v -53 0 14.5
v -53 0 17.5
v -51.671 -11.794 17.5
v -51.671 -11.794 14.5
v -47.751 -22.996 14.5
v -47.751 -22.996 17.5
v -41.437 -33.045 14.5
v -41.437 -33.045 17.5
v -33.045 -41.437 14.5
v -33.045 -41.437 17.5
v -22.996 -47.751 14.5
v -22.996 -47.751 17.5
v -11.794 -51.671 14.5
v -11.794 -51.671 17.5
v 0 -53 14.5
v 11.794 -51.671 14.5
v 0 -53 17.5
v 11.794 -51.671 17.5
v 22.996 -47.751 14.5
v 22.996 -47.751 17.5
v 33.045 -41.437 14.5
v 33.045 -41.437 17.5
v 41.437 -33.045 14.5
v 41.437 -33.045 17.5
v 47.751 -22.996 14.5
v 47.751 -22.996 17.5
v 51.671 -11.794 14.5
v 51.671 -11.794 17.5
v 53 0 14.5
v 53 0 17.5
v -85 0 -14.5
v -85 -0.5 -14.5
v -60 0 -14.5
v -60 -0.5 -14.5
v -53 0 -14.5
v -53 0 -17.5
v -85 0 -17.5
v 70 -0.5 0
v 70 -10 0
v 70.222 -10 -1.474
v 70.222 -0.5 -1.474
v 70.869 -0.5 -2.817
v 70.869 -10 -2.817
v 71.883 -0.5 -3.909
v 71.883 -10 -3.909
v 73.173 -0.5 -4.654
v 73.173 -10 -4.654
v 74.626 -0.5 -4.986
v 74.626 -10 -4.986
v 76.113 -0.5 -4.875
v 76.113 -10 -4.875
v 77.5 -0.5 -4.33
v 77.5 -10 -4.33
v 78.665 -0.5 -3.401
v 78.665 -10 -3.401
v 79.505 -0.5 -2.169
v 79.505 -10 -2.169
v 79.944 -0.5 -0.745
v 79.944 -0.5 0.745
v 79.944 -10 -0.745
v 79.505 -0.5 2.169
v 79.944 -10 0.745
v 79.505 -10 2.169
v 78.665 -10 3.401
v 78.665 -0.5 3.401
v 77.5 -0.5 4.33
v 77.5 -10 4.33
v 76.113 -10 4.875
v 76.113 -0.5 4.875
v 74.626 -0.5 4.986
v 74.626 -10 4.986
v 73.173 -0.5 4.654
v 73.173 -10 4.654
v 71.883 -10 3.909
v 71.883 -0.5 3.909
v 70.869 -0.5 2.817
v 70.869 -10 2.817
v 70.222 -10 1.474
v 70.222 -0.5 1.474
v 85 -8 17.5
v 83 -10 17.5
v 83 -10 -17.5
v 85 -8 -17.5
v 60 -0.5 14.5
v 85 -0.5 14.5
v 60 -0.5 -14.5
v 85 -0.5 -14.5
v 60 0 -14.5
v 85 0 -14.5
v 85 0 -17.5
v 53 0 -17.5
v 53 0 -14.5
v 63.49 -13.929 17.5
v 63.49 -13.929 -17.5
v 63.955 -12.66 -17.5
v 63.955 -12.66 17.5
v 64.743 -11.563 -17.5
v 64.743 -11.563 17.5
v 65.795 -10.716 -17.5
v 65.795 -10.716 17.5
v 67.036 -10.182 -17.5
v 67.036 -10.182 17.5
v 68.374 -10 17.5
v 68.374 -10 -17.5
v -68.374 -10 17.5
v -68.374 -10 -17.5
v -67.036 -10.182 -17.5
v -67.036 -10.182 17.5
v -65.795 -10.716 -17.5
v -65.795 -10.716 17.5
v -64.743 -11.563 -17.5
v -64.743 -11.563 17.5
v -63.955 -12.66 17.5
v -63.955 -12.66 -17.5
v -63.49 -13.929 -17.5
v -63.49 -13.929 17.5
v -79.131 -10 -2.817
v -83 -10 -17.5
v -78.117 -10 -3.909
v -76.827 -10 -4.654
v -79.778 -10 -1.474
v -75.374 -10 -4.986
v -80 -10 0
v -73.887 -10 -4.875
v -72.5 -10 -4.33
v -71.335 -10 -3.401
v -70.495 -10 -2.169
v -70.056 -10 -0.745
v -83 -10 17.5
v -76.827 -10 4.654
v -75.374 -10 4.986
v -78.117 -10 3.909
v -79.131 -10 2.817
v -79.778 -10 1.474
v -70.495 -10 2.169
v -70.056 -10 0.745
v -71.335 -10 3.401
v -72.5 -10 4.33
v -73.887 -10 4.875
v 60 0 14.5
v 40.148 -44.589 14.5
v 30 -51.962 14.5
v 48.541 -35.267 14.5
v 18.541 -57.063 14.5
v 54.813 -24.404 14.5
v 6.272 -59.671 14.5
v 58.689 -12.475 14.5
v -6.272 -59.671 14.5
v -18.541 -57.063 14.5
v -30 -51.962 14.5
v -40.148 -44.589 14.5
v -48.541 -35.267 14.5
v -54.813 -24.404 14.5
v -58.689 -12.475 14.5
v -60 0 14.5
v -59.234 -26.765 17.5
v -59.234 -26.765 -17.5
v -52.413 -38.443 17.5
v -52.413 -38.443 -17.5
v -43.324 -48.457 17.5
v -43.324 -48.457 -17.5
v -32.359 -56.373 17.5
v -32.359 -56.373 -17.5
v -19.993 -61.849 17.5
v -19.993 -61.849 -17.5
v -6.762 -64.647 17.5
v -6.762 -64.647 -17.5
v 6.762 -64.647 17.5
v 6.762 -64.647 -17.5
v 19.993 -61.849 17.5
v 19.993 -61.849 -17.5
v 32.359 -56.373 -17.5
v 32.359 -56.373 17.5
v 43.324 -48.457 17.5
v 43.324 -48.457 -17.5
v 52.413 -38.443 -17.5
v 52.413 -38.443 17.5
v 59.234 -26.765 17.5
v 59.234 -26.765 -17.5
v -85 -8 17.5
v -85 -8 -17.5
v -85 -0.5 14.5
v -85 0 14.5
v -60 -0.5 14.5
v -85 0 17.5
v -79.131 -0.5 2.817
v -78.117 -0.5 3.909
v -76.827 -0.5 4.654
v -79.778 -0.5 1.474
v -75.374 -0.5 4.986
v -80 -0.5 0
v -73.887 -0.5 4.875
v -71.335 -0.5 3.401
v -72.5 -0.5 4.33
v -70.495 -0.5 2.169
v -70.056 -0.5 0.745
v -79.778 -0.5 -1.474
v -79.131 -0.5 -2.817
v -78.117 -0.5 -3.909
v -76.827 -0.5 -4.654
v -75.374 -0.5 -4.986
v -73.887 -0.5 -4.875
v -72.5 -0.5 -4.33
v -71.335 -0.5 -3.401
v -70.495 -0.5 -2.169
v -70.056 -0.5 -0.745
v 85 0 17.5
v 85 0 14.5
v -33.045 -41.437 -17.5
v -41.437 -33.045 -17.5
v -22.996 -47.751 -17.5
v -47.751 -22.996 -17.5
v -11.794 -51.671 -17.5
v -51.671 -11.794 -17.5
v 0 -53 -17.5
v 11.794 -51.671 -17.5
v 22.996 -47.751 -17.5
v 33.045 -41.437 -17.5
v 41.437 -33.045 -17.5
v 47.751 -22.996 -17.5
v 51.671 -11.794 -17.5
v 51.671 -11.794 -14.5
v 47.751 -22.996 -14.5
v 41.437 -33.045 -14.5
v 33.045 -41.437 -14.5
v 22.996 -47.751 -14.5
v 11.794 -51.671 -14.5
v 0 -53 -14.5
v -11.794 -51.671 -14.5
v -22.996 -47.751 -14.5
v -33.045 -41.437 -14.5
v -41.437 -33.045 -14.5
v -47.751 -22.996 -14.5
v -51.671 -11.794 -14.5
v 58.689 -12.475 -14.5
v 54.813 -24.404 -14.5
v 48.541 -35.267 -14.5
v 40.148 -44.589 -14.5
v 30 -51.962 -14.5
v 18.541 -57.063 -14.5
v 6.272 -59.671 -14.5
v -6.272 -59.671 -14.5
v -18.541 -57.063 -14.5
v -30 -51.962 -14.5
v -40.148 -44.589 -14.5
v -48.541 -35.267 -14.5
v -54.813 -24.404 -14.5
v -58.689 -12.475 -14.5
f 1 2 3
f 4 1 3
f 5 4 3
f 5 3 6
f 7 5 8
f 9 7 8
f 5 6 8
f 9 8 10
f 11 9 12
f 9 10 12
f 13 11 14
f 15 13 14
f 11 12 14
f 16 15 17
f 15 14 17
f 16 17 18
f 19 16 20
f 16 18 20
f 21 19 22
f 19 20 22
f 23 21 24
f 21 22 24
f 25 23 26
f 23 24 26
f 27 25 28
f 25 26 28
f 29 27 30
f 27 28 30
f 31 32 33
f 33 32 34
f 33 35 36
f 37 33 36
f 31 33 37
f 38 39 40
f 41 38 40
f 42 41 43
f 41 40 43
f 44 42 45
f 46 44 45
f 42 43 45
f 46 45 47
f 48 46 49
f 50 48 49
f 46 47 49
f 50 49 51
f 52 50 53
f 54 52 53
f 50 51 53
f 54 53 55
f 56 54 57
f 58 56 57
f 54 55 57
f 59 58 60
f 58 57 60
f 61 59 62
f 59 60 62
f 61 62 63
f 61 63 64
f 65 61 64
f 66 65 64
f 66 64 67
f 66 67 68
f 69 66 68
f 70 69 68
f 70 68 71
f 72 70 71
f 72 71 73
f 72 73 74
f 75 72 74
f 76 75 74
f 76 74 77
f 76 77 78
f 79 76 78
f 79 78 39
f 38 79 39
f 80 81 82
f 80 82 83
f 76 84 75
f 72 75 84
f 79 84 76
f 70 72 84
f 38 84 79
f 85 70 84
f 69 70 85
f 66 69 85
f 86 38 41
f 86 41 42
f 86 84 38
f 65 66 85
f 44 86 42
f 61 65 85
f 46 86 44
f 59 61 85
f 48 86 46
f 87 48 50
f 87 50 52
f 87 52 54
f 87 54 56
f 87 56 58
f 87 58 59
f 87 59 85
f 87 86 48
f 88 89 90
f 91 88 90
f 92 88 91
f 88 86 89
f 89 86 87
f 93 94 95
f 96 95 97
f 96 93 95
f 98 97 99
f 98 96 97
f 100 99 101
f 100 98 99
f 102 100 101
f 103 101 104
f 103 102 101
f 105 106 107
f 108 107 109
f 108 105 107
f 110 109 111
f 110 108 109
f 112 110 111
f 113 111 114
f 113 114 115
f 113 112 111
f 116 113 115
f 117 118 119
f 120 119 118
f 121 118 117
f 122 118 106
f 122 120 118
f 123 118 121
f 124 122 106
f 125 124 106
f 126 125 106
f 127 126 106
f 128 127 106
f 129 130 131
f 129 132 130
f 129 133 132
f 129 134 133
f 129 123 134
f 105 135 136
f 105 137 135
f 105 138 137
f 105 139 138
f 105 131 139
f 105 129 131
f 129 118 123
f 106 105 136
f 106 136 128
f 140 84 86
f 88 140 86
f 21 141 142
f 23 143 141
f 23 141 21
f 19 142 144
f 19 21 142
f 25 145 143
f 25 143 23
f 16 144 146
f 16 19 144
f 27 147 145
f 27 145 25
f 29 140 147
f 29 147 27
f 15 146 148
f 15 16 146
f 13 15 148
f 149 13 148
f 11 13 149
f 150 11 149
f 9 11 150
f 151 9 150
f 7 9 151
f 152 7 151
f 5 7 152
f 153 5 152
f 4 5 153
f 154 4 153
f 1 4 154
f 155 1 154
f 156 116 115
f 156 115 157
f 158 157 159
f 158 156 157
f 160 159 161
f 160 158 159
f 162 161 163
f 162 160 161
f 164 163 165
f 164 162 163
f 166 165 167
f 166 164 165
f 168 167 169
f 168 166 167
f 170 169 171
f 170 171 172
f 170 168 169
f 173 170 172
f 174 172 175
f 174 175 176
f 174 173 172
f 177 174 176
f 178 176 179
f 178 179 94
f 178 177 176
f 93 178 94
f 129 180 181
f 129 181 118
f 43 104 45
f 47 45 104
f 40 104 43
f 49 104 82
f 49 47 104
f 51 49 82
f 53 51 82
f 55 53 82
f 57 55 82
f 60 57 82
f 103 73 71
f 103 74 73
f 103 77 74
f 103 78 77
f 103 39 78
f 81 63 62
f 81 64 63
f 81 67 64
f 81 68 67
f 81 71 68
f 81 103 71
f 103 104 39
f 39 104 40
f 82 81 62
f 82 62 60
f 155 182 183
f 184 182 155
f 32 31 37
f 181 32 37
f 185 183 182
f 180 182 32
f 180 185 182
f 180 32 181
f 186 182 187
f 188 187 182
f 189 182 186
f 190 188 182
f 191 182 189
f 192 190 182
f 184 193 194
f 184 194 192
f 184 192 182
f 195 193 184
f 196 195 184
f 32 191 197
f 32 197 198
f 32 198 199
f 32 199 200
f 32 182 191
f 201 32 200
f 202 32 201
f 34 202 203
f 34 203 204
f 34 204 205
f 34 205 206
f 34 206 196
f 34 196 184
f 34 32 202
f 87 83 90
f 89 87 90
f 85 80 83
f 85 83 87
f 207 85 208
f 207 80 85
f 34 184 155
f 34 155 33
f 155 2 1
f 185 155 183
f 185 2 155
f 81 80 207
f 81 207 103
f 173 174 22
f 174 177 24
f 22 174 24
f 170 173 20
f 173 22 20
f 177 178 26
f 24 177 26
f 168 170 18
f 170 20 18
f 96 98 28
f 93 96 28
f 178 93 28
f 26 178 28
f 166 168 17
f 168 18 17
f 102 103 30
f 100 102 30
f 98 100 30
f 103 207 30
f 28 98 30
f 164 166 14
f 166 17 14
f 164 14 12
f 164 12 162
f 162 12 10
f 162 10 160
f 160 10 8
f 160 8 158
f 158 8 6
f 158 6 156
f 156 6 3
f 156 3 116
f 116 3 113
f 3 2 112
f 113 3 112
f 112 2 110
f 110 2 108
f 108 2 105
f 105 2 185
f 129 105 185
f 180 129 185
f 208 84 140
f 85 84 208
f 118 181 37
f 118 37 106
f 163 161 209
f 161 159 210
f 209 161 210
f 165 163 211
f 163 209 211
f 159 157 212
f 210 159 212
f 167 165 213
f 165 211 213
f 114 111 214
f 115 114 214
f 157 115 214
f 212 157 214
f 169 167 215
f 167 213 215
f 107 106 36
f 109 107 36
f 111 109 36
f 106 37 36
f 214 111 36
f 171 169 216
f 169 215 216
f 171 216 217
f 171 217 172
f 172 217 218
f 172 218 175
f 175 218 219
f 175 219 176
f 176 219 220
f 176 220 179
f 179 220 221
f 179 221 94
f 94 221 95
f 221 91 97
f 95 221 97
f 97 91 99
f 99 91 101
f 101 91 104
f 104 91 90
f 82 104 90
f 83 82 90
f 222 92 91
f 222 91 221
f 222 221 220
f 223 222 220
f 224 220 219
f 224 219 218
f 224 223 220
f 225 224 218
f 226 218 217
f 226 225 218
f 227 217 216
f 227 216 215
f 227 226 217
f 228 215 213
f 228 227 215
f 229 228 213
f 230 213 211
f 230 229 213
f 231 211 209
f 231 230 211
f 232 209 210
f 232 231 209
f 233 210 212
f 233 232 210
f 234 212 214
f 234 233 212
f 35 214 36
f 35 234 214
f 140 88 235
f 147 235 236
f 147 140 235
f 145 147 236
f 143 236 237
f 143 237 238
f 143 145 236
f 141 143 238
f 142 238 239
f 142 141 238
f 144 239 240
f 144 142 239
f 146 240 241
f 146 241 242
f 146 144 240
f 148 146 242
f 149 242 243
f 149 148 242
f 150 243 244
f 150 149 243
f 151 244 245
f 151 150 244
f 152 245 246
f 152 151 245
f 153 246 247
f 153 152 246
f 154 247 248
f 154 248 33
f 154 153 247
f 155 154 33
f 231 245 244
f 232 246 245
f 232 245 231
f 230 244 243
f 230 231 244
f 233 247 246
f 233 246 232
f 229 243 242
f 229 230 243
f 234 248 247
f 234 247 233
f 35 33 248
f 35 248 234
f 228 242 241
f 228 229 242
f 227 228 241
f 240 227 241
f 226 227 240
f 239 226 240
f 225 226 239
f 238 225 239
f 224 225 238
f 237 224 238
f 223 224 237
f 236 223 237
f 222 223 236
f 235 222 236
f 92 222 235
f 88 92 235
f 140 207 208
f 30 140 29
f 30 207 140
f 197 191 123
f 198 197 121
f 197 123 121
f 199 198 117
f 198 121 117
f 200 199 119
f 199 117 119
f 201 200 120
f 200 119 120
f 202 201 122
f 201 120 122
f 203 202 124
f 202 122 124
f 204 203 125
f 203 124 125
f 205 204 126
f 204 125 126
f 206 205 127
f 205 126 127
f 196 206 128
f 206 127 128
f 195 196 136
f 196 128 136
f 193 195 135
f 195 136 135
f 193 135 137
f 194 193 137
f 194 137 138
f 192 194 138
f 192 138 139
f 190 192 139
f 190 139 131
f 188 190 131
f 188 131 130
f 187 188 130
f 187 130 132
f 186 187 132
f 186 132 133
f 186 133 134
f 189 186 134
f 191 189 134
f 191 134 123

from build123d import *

# Parameters (mm, degrees)
DODANIE_WYCI_GNI_CIE1_DEPTH = 14.5
DODANIE_WYCI_GNI_CIE2_START = 3
DODANIE_WYCI_GNI_CIE2_DEPTH = 3
DODANIE_WYCI_GNI_CIE3_DEPTH = 3
OTW_R_10_0_10_1_D           = 10
WYTNIJ_WYCI_GNI_CIE1_START  = -0.5
SZKIC7_W                    = 25
SZKIC7_H                    = 29
SZKIC7_R                    = 5
WYTNIJ_WYCI_GNI_CIE1_DEPTH  = 0.5


with BuildPart() as part:
    # Szkic1 → Dodanie-wyciągnięcie1 (new, symmetric)
    with BuildSketch(Plane.XY):
        with BuildLine():
            Line((-83, -10), (-68.373971656, -10))
            ThreePointArc((-68.373971656, -10), (-65.240055803, -11.104031388), (-63.490116538, -13.928571429))
            ThreePointArc((-63.490116538, -13.928571429), (0, -65), (63.490116538, -13.928571429))
            ThreePointArc((63.490116538, -13.928571429), (65.240055803, -11.104031388), (68.373971656, -10))
            Line((68.373971656, -10), (83, -10))
            Line((83, -10), (85, -8))
            Line((85, -8), (85, 0))
            Line((85, 0), (65, 0))
            Line((65, 0), (60, 0))
            ThreePointArc((60, 0), (0, -60), (-60, 0))
            Line((-60, 0), (-65, 0))
            Line((-65, 0), (-85, 0))
            Line((-85, 0), (-85, -8))
            Line((-85, -8), (-83, -10))
        make_face()
    extrude(amount=DODANIE_WYCI_GNI_CIE1_DEPTH, both=True)

    # Szkic2 → Dodanie-wyciągnięcie2 (add)
    with BuildSketch(Plane.XY.offset(14.5).offset(DODANIE_WYCI_GNI_CIE2_START)):
        with BuildLine():
            Line((-65, 0), (-60, 0))
            Line((-60, 0), (-53, 0))
            ThreePointArc((-53, 0), (0, -53), (53, 0))
            Line((53, 0), (60, 0))
            Line((60, 0), (65, 0))
            Line((65, 0), (85, 0))
            Line((85, 0), (85, -8))
            Line((85, -8), (83, -10))
            Line((83, -10), (68.373971656, -10))
            ThreePointArc((68.373971656, -10), (65.240055803, -11.104031388), (63.490116538, -13.928571429))
            ThreePointArc((63.490116538, -13.928571429), (0, -65), (-63.490116538, -13.928571429))
            ThreePointArc((-63.490116538, -13.928571429), (-65.240055803, -11.104031388), (-68.373971656, -10))
            Line((-68.373971656, -10), (-83, -10))
            Line((-83, -10), (-85, -8))
            Line((-85, -8), (-85, 0))
            Line((-85, 0), (-65, 0))
        make_face()
    extrude(amount=-DODANIE_WYCI_GNI_CIE2_DEPTH)

    # Szkic3 → Dodanie-wyciągnięcie3 (add)
    with BuildSketch(Plane(origin=(0, 0, -14.5), x_dir=(-1, 0, 0), z_dir=(0, 0, -1))):
        with BuildLine():
            Line((-65, 0), (-60, 0))
            Line((-60, 0), (-53, 0))
            ThreePointArc((-53, 0), (0, -53), (53, 0))
            Line((53, 0), (60, 0))
            Line((60, 0), (65, 0))
            Line((65, 0), (85, 0))
            Line((85, 0), (85, -8))
            Line((85, -8), (83, -10))
            Line((83, -10), (68.373971656, -10))
            ThreePointArc((68.373971656, -10), (65.240055803, -11.104031388), (63.490116538, -13.928571429))
            ThreePointArc((63.490116538, -13.928571429), (0, -65), (-63.490116538, -13.928571429))
            ThreePointArc((-63.490116538, -13.928571429), (-65.240055803, -11.104031388), (-68.373971656, -10))
            Line((-68.373971656, -10), (-83, -10))
            Line((-83, -10), (-85, -8))
            Line((-85, -8), (-85, 0))
            Line((-85, 0), (-65, 0))
        make_face()
    extrude(amount=DODANIE_WYCI_GNI_CIE3_DEPTH)

    # Otwór Ø10.0 (10)1 (through all)
    with Locations(Plane(origin=(0, 0, 0), x_dir=(1, 0, 0), z_dir=(0, 1, 0))):
        with Locations((75, 0), (-75, 0)):
            Hole(OTW_R_10_0_10_1_D / 2)

    # Szkic7 → Wytnij-wyciągnięcie1 (cut)
    # profile 1 of 2: a face of its own
    with BuildSketch(Plane(origin=(0, 0, 0), x_dir=(1, 0, 0), z_dir=(0, 1, 0)).offset(WYTNIJ_WYCI_GNI_CIE1_START)):
        with Locations((-72.5, 0)):
            Rectangle(SZKIC7_W, SZKIC7_H)
        with Locations(Location((-75, 0, 0), (0, 0, 270))):
            Circle(SZKIC7_R, mode=Mode.SUBTRACT)
    # profile 2 of 2: a face of its own
    with BuildSketch(Plane(origin=(0, 0, 0), x_dir=(1, 0, 0), z_dir=(0, 1, 0)).offset(WYTNIJ_WYCI_GNI_CIE1_START)):
        with Locations((72.5, 0)):
            Rectangle(SZKIC7_W, SZKIC7_H)
    extrude(amount=WYTNIJ_WYCI_GNI_CIE1_DEPTH, mode=Mode.SUBTRACT)


solid = part.part
